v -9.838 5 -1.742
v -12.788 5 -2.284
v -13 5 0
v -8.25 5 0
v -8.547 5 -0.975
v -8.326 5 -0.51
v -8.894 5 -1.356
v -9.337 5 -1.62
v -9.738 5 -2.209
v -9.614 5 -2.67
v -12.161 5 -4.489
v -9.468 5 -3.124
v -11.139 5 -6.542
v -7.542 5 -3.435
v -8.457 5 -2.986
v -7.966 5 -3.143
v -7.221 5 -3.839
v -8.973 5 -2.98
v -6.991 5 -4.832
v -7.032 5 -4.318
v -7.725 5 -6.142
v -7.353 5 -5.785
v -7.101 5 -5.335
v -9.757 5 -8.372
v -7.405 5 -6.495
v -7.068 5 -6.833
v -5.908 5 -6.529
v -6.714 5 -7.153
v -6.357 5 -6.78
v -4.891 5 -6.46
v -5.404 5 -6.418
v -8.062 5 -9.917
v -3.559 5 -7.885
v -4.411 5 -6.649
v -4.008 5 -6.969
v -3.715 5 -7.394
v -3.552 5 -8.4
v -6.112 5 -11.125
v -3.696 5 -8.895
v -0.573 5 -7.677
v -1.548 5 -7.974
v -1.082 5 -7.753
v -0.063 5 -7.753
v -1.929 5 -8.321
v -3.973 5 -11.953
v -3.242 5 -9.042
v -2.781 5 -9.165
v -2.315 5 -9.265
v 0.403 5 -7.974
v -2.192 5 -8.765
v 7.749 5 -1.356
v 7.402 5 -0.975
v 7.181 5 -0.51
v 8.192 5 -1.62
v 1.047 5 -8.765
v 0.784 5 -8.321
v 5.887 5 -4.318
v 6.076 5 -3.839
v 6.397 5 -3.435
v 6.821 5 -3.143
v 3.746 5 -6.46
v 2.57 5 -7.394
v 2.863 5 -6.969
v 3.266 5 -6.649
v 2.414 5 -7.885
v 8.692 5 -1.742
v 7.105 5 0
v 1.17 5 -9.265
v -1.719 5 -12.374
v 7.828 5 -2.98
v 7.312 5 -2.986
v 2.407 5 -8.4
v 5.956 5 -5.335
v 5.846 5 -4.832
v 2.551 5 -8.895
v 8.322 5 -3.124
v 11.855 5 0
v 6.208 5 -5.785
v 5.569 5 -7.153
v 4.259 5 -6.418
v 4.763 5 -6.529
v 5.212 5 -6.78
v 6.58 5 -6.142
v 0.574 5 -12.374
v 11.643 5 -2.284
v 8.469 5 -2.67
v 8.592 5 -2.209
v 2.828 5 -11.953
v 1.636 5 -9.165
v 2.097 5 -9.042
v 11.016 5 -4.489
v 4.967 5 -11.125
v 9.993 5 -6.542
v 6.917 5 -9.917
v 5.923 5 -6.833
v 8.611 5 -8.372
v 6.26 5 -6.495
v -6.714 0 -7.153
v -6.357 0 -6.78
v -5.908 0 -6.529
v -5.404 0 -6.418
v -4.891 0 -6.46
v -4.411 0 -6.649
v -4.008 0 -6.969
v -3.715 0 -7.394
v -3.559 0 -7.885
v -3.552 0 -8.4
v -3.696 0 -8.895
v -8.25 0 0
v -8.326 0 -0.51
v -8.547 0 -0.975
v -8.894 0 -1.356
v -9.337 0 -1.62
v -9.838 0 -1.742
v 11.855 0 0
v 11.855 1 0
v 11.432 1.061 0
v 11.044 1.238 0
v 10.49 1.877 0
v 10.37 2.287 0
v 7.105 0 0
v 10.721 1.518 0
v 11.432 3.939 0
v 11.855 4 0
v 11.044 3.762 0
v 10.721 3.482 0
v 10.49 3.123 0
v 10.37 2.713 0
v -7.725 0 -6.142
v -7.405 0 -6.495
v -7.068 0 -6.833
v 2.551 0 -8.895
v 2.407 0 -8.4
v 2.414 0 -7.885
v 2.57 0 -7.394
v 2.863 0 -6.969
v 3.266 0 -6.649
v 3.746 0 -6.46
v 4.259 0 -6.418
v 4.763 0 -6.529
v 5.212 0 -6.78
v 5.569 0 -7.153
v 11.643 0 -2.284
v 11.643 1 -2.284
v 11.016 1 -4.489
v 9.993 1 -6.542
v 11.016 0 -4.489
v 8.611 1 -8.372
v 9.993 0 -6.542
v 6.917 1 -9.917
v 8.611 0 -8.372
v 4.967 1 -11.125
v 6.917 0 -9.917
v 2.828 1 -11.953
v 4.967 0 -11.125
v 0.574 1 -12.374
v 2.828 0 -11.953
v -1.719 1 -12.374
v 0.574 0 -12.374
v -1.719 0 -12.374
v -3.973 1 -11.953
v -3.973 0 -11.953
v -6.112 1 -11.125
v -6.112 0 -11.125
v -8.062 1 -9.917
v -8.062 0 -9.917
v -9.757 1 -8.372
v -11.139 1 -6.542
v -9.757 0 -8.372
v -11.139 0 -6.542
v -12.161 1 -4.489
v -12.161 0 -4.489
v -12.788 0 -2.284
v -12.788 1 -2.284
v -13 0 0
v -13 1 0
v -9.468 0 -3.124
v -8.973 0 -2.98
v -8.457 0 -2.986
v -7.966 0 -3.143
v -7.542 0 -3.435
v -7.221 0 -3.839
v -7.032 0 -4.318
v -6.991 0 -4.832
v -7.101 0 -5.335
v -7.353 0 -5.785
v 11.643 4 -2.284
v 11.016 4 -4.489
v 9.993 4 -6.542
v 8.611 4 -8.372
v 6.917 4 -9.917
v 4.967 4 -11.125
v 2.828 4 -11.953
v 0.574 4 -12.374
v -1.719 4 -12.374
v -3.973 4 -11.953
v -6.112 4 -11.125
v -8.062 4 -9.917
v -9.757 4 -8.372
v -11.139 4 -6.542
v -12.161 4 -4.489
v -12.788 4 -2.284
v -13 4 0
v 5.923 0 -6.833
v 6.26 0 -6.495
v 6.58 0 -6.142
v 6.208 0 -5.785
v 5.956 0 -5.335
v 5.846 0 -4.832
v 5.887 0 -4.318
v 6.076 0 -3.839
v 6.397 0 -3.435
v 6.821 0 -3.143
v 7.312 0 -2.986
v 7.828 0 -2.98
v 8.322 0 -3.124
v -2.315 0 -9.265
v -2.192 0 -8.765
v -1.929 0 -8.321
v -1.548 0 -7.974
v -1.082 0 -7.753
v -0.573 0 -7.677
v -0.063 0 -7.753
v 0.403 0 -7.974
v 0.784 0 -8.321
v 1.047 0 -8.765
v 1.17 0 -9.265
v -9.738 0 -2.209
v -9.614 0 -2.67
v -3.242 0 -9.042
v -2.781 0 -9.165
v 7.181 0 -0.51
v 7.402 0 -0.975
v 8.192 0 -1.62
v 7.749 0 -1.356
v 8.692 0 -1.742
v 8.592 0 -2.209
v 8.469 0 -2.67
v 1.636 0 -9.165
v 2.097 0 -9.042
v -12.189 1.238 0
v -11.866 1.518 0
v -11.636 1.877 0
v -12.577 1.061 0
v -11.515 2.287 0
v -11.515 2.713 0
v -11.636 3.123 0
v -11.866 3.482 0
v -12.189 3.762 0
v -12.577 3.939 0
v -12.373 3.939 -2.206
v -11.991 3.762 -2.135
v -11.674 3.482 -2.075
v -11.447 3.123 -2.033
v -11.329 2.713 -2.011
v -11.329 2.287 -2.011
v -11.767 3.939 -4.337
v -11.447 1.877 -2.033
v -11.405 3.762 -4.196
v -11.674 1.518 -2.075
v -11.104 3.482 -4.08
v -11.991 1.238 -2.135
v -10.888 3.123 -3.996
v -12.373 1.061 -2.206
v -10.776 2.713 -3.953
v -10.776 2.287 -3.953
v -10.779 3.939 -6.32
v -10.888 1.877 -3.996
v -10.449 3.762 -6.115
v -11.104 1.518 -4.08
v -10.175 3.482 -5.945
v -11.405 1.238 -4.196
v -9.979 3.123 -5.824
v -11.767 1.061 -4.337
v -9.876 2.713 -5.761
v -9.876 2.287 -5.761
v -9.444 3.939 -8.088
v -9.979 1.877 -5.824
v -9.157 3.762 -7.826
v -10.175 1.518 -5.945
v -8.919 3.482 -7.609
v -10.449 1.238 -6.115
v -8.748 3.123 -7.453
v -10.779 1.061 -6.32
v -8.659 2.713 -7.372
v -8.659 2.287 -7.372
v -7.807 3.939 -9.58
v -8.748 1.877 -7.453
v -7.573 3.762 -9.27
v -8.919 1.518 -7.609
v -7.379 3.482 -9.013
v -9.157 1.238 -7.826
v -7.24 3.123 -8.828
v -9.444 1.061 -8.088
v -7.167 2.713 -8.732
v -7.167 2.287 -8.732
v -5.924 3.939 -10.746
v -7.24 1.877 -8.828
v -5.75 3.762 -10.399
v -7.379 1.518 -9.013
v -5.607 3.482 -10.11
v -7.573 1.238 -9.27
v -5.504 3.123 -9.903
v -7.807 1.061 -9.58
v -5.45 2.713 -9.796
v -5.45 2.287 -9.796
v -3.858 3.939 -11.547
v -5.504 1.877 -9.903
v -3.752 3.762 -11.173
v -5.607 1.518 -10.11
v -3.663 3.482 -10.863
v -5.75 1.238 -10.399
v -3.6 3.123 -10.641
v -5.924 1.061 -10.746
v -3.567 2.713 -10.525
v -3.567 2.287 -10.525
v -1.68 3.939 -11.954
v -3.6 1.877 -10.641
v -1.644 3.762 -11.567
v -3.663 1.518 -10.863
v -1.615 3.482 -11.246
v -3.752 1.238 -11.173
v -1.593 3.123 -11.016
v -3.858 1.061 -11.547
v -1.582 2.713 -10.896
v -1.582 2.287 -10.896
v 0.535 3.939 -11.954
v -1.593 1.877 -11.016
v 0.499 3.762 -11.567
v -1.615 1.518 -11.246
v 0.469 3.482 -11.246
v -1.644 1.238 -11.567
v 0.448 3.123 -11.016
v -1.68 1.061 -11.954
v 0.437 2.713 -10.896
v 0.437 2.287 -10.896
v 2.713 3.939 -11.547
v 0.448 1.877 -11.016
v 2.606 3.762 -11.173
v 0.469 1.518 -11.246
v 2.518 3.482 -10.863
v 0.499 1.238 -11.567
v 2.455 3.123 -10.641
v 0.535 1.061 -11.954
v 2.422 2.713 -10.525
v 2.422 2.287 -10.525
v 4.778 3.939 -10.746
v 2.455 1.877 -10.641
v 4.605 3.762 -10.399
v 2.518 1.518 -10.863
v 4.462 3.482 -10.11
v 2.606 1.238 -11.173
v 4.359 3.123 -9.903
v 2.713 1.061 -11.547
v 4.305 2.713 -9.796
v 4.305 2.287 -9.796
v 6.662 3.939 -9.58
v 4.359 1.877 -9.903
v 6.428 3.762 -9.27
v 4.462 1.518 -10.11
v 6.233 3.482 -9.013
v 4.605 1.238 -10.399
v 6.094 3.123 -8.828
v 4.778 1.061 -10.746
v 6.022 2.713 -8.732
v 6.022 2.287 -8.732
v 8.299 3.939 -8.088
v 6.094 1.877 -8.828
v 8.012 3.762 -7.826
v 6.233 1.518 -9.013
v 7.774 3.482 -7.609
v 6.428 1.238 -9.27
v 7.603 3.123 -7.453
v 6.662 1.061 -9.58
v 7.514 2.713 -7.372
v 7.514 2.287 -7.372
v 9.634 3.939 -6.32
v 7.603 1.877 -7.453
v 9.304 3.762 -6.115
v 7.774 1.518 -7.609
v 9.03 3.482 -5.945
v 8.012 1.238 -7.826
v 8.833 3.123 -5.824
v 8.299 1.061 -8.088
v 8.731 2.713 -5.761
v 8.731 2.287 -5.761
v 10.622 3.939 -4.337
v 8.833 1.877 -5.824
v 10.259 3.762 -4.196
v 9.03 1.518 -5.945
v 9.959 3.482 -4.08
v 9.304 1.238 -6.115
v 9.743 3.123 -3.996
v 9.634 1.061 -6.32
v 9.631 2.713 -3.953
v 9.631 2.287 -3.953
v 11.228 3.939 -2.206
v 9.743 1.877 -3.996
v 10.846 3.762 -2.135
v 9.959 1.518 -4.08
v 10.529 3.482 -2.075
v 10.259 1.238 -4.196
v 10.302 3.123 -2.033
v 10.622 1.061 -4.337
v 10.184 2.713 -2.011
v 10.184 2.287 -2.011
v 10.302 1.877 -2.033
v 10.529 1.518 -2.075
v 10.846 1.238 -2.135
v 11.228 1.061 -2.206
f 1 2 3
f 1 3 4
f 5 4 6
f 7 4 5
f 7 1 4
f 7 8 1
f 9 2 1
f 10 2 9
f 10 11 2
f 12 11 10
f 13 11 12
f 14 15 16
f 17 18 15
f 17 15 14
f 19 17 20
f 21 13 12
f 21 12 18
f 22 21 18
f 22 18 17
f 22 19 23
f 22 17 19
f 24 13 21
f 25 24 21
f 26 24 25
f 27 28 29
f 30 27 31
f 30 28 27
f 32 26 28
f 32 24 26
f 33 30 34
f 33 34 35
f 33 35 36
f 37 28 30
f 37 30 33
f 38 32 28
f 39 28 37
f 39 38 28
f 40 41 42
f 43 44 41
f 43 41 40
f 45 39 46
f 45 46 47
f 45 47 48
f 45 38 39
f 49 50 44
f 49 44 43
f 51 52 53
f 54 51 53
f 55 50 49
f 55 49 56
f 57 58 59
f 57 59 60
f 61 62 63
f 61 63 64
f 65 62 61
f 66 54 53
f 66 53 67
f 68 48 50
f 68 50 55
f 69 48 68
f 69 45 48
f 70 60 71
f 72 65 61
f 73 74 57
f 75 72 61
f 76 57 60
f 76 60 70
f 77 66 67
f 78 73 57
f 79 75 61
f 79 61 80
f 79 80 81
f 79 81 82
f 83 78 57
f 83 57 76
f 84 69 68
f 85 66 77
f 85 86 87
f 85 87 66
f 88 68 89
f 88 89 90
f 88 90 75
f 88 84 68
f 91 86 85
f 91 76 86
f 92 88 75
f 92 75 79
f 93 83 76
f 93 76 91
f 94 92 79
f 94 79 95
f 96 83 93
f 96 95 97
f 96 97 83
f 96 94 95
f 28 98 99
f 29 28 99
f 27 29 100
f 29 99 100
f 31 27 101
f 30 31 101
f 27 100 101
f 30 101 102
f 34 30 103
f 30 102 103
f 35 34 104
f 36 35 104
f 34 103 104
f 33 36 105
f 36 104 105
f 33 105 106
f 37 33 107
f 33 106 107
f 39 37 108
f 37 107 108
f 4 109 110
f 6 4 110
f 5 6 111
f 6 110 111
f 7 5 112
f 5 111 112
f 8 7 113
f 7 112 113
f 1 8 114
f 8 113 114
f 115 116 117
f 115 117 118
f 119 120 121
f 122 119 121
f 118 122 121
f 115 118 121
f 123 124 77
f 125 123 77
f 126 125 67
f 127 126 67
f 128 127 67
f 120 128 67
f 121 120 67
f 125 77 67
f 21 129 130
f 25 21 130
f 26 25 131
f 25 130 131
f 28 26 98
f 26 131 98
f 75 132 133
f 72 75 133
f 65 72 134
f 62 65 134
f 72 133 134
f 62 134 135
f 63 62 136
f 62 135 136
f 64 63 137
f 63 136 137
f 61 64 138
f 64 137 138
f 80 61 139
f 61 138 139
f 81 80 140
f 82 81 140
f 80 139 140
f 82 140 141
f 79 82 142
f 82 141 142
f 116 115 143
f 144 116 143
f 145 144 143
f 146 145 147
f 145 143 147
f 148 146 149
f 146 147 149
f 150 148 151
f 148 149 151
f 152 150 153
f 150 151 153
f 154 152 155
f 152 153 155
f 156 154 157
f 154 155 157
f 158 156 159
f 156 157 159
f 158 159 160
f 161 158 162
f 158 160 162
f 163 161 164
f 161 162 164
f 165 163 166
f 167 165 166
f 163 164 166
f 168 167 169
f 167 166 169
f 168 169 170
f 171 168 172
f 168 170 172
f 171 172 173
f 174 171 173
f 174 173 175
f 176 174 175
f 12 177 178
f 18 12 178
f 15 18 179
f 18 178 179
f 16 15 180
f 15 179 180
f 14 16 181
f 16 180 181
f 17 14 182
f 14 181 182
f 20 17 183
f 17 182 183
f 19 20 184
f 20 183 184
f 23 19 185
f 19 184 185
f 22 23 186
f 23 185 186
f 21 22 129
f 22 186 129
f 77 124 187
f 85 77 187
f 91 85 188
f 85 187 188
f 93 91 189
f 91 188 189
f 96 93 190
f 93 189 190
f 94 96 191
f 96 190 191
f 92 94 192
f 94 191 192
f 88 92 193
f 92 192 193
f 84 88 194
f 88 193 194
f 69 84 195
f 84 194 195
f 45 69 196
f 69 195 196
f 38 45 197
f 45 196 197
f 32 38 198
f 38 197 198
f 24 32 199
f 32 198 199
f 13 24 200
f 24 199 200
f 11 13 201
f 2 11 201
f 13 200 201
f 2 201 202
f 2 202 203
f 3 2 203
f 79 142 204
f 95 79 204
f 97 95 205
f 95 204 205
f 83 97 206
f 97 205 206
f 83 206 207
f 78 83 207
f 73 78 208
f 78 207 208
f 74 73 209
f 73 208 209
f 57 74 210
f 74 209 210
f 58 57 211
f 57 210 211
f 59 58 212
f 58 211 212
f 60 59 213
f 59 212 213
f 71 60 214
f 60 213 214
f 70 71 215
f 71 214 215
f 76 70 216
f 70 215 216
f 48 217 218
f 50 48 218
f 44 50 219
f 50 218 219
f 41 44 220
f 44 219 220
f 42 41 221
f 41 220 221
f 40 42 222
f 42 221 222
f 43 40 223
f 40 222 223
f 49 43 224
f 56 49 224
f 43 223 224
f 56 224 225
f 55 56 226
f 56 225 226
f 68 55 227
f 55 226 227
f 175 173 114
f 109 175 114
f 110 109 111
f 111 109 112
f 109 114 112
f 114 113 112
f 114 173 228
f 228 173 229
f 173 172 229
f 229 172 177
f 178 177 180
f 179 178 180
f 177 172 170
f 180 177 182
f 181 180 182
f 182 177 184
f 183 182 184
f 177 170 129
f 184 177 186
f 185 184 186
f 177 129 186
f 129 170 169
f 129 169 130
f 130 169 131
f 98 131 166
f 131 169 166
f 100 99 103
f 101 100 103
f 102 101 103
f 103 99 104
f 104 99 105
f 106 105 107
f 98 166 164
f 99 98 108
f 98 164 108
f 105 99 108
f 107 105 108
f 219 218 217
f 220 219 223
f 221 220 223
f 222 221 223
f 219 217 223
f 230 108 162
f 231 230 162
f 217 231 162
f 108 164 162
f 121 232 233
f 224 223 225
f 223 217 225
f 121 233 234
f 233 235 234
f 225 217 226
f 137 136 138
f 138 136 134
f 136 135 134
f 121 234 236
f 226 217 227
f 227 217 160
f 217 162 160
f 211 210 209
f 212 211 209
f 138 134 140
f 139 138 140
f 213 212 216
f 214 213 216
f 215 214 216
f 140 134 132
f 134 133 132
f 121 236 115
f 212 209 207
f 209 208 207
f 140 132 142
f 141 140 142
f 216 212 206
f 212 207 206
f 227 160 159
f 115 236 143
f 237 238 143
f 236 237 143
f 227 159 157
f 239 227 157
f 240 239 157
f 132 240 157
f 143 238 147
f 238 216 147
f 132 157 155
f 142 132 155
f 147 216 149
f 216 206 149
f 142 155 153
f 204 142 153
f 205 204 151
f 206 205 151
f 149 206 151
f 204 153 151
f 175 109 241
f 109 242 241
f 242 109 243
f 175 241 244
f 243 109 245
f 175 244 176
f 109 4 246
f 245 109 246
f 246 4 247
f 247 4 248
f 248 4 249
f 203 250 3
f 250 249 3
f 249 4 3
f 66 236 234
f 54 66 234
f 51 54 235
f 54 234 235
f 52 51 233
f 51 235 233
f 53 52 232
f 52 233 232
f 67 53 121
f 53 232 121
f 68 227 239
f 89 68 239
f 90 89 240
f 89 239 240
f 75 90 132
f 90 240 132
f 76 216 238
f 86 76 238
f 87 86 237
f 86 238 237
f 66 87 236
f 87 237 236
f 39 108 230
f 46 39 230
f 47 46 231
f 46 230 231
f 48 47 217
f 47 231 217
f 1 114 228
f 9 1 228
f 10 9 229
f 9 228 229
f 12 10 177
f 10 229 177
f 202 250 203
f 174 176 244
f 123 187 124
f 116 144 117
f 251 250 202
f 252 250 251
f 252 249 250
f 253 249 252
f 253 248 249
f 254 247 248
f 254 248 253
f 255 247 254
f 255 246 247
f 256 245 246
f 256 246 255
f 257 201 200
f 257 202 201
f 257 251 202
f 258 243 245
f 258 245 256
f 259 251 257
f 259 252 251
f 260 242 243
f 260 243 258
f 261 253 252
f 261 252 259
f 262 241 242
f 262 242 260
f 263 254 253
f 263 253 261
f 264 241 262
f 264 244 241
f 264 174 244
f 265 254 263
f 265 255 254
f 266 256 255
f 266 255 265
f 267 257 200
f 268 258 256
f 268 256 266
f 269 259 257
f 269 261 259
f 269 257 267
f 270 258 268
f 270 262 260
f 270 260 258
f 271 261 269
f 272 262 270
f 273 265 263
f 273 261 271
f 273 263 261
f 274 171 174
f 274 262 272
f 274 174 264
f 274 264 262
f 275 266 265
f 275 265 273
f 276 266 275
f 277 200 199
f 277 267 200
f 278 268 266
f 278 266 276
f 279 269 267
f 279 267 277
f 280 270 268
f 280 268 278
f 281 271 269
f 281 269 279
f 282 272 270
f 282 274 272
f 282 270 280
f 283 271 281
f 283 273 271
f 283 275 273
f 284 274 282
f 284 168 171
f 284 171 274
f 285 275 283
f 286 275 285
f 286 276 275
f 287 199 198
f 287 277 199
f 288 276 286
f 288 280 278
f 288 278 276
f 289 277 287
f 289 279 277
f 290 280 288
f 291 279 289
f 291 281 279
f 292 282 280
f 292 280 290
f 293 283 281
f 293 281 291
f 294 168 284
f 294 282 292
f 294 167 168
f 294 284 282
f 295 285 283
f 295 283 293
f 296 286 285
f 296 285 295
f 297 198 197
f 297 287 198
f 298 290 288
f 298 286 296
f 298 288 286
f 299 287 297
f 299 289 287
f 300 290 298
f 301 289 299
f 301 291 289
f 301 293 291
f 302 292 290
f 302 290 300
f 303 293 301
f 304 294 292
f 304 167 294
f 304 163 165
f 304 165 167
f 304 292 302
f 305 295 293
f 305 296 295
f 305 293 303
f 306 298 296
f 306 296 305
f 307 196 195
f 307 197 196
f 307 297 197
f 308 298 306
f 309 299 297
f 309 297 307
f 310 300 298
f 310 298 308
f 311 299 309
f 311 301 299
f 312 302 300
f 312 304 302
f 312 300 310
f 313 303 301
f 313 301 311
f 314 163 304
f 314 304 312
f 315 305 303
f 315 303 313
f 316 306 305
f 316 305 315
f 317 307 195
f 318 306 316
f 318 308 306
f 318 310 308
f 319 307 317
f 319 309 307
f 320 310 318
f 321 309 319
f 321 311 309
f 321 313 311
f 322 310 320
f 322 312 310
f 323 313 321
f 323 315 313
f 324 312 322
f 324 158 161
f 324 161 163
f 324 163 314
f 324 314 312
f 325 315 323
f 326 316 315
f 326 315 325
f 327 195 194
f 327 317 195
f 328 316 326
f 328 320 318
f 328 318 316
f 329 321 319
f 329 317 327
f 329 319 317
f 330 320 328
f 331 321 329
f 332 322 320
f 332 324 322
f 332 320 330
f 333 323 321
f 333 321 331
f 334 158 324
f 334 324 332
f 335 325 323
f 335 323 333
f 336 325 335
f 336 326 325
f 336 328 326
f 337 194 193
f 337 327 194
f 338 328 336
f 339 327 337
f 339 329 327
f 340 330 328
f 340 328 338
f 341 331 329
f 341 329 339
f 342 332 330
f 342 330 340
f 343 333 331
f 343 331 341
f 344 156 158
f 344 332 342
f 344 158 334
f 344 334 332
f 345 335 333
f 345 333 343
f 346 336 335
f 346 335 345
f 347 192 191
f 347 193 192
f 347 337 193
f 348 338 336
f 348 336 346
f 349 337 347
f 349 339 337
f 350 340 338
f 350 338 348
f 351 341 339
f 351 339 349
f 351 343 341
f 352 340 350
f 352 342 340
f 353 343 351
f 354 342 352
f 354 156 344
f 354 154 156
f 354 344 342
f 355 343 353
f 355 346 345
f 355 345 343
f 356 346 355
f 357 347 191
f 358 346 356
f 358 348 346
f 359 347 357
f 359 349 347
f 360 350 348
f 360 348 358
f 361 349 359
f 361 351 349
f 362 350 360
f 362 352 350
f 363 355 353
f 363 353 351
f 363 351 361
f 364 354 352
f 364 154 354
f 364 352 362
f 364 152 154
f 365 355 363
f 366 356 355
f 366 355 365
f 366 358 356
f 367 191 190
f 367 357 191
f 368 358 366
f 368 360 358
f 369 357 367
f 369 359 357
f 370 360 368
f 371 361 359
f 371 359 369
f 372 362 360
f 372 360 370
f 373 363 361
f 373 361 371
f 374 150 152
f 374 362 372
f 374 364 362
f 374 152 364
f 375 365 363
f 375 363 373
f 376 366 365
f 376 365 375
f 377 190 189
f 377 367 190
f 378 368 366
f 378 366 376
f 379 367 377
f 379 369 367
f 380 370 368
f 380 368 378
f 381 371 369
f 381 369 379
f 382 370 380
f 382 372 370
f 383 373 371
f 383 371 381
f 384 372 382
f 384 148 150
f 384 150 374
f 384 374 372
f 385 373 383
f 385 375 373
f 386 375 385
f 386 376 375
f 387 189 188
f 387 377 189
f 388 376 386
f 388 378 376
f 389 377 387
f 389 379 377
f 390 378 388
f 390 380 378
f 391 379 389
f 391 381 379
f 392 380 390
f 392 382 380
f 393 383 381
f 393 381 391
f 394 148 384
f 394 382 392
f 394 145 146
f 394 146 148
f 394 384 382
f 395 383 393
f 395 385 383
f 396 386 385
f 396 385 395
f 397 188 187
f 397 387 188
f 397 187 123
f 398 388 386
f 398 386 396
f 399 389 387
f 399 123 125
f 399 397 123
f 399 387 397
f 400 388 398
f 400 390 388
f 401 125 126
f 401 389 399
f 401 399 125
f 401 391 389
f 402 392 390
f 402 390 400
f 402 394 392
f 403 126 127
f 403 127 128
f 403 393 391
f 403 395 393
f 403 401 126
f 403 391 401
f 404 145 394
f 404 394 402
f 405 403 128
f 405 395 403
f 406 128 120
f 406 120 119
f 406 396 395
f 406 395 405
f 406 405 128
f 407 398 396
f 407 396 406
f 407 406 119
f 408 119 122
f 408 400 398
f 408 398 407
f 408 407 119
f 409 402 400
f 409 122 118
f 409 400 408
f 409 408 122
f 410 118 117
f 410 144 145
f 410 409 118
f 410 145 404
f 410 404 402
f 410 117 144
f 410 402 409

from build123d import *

# Parameters (mm, degrees)
SKETCH1_R           = 12.427436065
BOSS_EXTRUDE1_DEPTH = 5
CUT_EXTRUDE1_DEPTH  = 6
SKETCH8_R           = 1.5


with BuildPart() as part:
    # Sketch1 → Boss-Extrude1 (new body)
    with BuildSketch(Plane(origin=(0, 0, 0), x_dir=(1, 0, 0), z_dir=(0, 1, 0))):
        with Locations((-0.572563935, 0)):
            Circle(SKETCH1_R)
        with BuildLine():
            ThreePointArc((-9.837575138, 1.742446029), (-9.678767906, 2.44), (-9.467522018, 3.123503075))
            ThreePointArc((-9.467522018, 3.123503075), (-7.221418603, 3.838718032), (-7.725075989, 6.141508127))
            ThreePointArc((-7.725075989, 6.141508127), (-7.238767906, 6.66620397), (-6.714072063, 7.152512053))
            ThreePointArc((-6.714072063, 7.152512053), (-4.411281968, 6.648854668), (-3.696067011, 8.894958082))
            ThreePointArc((-3.696067011, 8.894958082), (-3.012563935, 9.10620397), (-2.315009965, 9.265011203))
            ThreePointArc((-2.315009965, 9.265011203), (-0.572563935, 7.677436065), (1.169882094, 9.265011203))
            ThreePointArc((1.169882094, 9.265011203), (1.867436065, 9.10620397), (2.55093914, 8.894958082))
            ThreePointArc((2.55093914, 8.894958082), (3.266154097, 6.648854668), (5.568944192, 7.152512053))
            ThreePointArc((5.568944192, 7.152512053), (6.093640035, 6.66620397), (6.579948118, 6.141508127))
            ThreePointArc((6.579948118, 6.141508127), (6.076290732, 3.838718032), (8.322394147, 3.123503075))
            ThreePointArc((8.322394147, 3.123503075), (8.533640035, 2.44), (8.692447267, 1.742446029))
            ThreePointArc((8.692447267, 1.742446029), (7.104872129, 0), (8.692447267, -1.742446029))
            ThreePointArc((8.692447267, -1.742446029), (8.533640035, -2.44), (8.322394147, -3.123503075))
            ThreePointArc((8.322394147, -3.123503075), (6.076290732, -3.838718032), (6.579948118, -6.141508127))
            ThreePointArc((6.579948118, -6.141508127), (6.093640035, -6.66620397), (5.568944192, -7.152512053))
            ThreePointArc((5.568944192, -7.152512053), (3.266154097, -6.648854668), (2.55093914, -8.894958082))
            ThreePointArc((2.55093914, -8.894958082), (1.867436065, -9.10620397), (1.169882094, -9.265011203))
            ThreePointArc((1.169882094, -9.265011203), (-0.572563935, -7.677436065), (-2.315009965, -9.265011203))
            ThreePointArc((-2.315009965, -9.265011203), (-3.012563935, -9.10620397), (-3.696067011, -8.894958082))
            ThreePointArc((-3.696067011, -8.894958082), (-4.411281968, -6.648854668), (-6.714072063, -7.152512053))
            ThreePointArc((-6.714072063, -7.152512053), (-7.238767906, -6.66620397), (-7.725075989, -6.141508127))
            ThreePointArc((-7.725075989, -6.141508127), (-7.221418603, -3.838718032), (-9.467522018, -3.123503075))
            ThreePointArc((-9.467522018, -3.123503075), (-9.678767906, -2.44), (-9.837575138, -1.742446029))
            ThreePointArc((-9.837575138, -1.742446029), (-8.25, 0), (-9.837575138, 1.742446029))
        make_face(mode=Mode.SUBTRACT)
    extrude(amount=BOSS_EXTRUDE1_DEPTH)

    # Sketch7 → Cut-Extrude1 (cut, through all)
    with BuildSketch(Plane(origin=(0, 5, 0), x_dir=(1, 0, 0), z_dir=(0, 1, 0))):
        Polygon((13.300548716, 0), (-14.205268785, 0), (-13.392288958, -15.44944458), (9.438894535, -14.771961391), align=None)
    extrude(amount=-CUT_EXTRUDE1_DEPTH, mode=Mode.SUBTRACT)

    # Sketch8 → Cut-Revolve2 (revolve, cut)
    with BuildSketch(Plane.XY):
        with Locations((11.854872129, 2.5)):
            Circle(SKETCH8_R)
    revolve(axis=Axis((-0.572563935, 5, 0), (0, -1, 0)), mode=Mode.SUBTRACT)


solid = part.part
